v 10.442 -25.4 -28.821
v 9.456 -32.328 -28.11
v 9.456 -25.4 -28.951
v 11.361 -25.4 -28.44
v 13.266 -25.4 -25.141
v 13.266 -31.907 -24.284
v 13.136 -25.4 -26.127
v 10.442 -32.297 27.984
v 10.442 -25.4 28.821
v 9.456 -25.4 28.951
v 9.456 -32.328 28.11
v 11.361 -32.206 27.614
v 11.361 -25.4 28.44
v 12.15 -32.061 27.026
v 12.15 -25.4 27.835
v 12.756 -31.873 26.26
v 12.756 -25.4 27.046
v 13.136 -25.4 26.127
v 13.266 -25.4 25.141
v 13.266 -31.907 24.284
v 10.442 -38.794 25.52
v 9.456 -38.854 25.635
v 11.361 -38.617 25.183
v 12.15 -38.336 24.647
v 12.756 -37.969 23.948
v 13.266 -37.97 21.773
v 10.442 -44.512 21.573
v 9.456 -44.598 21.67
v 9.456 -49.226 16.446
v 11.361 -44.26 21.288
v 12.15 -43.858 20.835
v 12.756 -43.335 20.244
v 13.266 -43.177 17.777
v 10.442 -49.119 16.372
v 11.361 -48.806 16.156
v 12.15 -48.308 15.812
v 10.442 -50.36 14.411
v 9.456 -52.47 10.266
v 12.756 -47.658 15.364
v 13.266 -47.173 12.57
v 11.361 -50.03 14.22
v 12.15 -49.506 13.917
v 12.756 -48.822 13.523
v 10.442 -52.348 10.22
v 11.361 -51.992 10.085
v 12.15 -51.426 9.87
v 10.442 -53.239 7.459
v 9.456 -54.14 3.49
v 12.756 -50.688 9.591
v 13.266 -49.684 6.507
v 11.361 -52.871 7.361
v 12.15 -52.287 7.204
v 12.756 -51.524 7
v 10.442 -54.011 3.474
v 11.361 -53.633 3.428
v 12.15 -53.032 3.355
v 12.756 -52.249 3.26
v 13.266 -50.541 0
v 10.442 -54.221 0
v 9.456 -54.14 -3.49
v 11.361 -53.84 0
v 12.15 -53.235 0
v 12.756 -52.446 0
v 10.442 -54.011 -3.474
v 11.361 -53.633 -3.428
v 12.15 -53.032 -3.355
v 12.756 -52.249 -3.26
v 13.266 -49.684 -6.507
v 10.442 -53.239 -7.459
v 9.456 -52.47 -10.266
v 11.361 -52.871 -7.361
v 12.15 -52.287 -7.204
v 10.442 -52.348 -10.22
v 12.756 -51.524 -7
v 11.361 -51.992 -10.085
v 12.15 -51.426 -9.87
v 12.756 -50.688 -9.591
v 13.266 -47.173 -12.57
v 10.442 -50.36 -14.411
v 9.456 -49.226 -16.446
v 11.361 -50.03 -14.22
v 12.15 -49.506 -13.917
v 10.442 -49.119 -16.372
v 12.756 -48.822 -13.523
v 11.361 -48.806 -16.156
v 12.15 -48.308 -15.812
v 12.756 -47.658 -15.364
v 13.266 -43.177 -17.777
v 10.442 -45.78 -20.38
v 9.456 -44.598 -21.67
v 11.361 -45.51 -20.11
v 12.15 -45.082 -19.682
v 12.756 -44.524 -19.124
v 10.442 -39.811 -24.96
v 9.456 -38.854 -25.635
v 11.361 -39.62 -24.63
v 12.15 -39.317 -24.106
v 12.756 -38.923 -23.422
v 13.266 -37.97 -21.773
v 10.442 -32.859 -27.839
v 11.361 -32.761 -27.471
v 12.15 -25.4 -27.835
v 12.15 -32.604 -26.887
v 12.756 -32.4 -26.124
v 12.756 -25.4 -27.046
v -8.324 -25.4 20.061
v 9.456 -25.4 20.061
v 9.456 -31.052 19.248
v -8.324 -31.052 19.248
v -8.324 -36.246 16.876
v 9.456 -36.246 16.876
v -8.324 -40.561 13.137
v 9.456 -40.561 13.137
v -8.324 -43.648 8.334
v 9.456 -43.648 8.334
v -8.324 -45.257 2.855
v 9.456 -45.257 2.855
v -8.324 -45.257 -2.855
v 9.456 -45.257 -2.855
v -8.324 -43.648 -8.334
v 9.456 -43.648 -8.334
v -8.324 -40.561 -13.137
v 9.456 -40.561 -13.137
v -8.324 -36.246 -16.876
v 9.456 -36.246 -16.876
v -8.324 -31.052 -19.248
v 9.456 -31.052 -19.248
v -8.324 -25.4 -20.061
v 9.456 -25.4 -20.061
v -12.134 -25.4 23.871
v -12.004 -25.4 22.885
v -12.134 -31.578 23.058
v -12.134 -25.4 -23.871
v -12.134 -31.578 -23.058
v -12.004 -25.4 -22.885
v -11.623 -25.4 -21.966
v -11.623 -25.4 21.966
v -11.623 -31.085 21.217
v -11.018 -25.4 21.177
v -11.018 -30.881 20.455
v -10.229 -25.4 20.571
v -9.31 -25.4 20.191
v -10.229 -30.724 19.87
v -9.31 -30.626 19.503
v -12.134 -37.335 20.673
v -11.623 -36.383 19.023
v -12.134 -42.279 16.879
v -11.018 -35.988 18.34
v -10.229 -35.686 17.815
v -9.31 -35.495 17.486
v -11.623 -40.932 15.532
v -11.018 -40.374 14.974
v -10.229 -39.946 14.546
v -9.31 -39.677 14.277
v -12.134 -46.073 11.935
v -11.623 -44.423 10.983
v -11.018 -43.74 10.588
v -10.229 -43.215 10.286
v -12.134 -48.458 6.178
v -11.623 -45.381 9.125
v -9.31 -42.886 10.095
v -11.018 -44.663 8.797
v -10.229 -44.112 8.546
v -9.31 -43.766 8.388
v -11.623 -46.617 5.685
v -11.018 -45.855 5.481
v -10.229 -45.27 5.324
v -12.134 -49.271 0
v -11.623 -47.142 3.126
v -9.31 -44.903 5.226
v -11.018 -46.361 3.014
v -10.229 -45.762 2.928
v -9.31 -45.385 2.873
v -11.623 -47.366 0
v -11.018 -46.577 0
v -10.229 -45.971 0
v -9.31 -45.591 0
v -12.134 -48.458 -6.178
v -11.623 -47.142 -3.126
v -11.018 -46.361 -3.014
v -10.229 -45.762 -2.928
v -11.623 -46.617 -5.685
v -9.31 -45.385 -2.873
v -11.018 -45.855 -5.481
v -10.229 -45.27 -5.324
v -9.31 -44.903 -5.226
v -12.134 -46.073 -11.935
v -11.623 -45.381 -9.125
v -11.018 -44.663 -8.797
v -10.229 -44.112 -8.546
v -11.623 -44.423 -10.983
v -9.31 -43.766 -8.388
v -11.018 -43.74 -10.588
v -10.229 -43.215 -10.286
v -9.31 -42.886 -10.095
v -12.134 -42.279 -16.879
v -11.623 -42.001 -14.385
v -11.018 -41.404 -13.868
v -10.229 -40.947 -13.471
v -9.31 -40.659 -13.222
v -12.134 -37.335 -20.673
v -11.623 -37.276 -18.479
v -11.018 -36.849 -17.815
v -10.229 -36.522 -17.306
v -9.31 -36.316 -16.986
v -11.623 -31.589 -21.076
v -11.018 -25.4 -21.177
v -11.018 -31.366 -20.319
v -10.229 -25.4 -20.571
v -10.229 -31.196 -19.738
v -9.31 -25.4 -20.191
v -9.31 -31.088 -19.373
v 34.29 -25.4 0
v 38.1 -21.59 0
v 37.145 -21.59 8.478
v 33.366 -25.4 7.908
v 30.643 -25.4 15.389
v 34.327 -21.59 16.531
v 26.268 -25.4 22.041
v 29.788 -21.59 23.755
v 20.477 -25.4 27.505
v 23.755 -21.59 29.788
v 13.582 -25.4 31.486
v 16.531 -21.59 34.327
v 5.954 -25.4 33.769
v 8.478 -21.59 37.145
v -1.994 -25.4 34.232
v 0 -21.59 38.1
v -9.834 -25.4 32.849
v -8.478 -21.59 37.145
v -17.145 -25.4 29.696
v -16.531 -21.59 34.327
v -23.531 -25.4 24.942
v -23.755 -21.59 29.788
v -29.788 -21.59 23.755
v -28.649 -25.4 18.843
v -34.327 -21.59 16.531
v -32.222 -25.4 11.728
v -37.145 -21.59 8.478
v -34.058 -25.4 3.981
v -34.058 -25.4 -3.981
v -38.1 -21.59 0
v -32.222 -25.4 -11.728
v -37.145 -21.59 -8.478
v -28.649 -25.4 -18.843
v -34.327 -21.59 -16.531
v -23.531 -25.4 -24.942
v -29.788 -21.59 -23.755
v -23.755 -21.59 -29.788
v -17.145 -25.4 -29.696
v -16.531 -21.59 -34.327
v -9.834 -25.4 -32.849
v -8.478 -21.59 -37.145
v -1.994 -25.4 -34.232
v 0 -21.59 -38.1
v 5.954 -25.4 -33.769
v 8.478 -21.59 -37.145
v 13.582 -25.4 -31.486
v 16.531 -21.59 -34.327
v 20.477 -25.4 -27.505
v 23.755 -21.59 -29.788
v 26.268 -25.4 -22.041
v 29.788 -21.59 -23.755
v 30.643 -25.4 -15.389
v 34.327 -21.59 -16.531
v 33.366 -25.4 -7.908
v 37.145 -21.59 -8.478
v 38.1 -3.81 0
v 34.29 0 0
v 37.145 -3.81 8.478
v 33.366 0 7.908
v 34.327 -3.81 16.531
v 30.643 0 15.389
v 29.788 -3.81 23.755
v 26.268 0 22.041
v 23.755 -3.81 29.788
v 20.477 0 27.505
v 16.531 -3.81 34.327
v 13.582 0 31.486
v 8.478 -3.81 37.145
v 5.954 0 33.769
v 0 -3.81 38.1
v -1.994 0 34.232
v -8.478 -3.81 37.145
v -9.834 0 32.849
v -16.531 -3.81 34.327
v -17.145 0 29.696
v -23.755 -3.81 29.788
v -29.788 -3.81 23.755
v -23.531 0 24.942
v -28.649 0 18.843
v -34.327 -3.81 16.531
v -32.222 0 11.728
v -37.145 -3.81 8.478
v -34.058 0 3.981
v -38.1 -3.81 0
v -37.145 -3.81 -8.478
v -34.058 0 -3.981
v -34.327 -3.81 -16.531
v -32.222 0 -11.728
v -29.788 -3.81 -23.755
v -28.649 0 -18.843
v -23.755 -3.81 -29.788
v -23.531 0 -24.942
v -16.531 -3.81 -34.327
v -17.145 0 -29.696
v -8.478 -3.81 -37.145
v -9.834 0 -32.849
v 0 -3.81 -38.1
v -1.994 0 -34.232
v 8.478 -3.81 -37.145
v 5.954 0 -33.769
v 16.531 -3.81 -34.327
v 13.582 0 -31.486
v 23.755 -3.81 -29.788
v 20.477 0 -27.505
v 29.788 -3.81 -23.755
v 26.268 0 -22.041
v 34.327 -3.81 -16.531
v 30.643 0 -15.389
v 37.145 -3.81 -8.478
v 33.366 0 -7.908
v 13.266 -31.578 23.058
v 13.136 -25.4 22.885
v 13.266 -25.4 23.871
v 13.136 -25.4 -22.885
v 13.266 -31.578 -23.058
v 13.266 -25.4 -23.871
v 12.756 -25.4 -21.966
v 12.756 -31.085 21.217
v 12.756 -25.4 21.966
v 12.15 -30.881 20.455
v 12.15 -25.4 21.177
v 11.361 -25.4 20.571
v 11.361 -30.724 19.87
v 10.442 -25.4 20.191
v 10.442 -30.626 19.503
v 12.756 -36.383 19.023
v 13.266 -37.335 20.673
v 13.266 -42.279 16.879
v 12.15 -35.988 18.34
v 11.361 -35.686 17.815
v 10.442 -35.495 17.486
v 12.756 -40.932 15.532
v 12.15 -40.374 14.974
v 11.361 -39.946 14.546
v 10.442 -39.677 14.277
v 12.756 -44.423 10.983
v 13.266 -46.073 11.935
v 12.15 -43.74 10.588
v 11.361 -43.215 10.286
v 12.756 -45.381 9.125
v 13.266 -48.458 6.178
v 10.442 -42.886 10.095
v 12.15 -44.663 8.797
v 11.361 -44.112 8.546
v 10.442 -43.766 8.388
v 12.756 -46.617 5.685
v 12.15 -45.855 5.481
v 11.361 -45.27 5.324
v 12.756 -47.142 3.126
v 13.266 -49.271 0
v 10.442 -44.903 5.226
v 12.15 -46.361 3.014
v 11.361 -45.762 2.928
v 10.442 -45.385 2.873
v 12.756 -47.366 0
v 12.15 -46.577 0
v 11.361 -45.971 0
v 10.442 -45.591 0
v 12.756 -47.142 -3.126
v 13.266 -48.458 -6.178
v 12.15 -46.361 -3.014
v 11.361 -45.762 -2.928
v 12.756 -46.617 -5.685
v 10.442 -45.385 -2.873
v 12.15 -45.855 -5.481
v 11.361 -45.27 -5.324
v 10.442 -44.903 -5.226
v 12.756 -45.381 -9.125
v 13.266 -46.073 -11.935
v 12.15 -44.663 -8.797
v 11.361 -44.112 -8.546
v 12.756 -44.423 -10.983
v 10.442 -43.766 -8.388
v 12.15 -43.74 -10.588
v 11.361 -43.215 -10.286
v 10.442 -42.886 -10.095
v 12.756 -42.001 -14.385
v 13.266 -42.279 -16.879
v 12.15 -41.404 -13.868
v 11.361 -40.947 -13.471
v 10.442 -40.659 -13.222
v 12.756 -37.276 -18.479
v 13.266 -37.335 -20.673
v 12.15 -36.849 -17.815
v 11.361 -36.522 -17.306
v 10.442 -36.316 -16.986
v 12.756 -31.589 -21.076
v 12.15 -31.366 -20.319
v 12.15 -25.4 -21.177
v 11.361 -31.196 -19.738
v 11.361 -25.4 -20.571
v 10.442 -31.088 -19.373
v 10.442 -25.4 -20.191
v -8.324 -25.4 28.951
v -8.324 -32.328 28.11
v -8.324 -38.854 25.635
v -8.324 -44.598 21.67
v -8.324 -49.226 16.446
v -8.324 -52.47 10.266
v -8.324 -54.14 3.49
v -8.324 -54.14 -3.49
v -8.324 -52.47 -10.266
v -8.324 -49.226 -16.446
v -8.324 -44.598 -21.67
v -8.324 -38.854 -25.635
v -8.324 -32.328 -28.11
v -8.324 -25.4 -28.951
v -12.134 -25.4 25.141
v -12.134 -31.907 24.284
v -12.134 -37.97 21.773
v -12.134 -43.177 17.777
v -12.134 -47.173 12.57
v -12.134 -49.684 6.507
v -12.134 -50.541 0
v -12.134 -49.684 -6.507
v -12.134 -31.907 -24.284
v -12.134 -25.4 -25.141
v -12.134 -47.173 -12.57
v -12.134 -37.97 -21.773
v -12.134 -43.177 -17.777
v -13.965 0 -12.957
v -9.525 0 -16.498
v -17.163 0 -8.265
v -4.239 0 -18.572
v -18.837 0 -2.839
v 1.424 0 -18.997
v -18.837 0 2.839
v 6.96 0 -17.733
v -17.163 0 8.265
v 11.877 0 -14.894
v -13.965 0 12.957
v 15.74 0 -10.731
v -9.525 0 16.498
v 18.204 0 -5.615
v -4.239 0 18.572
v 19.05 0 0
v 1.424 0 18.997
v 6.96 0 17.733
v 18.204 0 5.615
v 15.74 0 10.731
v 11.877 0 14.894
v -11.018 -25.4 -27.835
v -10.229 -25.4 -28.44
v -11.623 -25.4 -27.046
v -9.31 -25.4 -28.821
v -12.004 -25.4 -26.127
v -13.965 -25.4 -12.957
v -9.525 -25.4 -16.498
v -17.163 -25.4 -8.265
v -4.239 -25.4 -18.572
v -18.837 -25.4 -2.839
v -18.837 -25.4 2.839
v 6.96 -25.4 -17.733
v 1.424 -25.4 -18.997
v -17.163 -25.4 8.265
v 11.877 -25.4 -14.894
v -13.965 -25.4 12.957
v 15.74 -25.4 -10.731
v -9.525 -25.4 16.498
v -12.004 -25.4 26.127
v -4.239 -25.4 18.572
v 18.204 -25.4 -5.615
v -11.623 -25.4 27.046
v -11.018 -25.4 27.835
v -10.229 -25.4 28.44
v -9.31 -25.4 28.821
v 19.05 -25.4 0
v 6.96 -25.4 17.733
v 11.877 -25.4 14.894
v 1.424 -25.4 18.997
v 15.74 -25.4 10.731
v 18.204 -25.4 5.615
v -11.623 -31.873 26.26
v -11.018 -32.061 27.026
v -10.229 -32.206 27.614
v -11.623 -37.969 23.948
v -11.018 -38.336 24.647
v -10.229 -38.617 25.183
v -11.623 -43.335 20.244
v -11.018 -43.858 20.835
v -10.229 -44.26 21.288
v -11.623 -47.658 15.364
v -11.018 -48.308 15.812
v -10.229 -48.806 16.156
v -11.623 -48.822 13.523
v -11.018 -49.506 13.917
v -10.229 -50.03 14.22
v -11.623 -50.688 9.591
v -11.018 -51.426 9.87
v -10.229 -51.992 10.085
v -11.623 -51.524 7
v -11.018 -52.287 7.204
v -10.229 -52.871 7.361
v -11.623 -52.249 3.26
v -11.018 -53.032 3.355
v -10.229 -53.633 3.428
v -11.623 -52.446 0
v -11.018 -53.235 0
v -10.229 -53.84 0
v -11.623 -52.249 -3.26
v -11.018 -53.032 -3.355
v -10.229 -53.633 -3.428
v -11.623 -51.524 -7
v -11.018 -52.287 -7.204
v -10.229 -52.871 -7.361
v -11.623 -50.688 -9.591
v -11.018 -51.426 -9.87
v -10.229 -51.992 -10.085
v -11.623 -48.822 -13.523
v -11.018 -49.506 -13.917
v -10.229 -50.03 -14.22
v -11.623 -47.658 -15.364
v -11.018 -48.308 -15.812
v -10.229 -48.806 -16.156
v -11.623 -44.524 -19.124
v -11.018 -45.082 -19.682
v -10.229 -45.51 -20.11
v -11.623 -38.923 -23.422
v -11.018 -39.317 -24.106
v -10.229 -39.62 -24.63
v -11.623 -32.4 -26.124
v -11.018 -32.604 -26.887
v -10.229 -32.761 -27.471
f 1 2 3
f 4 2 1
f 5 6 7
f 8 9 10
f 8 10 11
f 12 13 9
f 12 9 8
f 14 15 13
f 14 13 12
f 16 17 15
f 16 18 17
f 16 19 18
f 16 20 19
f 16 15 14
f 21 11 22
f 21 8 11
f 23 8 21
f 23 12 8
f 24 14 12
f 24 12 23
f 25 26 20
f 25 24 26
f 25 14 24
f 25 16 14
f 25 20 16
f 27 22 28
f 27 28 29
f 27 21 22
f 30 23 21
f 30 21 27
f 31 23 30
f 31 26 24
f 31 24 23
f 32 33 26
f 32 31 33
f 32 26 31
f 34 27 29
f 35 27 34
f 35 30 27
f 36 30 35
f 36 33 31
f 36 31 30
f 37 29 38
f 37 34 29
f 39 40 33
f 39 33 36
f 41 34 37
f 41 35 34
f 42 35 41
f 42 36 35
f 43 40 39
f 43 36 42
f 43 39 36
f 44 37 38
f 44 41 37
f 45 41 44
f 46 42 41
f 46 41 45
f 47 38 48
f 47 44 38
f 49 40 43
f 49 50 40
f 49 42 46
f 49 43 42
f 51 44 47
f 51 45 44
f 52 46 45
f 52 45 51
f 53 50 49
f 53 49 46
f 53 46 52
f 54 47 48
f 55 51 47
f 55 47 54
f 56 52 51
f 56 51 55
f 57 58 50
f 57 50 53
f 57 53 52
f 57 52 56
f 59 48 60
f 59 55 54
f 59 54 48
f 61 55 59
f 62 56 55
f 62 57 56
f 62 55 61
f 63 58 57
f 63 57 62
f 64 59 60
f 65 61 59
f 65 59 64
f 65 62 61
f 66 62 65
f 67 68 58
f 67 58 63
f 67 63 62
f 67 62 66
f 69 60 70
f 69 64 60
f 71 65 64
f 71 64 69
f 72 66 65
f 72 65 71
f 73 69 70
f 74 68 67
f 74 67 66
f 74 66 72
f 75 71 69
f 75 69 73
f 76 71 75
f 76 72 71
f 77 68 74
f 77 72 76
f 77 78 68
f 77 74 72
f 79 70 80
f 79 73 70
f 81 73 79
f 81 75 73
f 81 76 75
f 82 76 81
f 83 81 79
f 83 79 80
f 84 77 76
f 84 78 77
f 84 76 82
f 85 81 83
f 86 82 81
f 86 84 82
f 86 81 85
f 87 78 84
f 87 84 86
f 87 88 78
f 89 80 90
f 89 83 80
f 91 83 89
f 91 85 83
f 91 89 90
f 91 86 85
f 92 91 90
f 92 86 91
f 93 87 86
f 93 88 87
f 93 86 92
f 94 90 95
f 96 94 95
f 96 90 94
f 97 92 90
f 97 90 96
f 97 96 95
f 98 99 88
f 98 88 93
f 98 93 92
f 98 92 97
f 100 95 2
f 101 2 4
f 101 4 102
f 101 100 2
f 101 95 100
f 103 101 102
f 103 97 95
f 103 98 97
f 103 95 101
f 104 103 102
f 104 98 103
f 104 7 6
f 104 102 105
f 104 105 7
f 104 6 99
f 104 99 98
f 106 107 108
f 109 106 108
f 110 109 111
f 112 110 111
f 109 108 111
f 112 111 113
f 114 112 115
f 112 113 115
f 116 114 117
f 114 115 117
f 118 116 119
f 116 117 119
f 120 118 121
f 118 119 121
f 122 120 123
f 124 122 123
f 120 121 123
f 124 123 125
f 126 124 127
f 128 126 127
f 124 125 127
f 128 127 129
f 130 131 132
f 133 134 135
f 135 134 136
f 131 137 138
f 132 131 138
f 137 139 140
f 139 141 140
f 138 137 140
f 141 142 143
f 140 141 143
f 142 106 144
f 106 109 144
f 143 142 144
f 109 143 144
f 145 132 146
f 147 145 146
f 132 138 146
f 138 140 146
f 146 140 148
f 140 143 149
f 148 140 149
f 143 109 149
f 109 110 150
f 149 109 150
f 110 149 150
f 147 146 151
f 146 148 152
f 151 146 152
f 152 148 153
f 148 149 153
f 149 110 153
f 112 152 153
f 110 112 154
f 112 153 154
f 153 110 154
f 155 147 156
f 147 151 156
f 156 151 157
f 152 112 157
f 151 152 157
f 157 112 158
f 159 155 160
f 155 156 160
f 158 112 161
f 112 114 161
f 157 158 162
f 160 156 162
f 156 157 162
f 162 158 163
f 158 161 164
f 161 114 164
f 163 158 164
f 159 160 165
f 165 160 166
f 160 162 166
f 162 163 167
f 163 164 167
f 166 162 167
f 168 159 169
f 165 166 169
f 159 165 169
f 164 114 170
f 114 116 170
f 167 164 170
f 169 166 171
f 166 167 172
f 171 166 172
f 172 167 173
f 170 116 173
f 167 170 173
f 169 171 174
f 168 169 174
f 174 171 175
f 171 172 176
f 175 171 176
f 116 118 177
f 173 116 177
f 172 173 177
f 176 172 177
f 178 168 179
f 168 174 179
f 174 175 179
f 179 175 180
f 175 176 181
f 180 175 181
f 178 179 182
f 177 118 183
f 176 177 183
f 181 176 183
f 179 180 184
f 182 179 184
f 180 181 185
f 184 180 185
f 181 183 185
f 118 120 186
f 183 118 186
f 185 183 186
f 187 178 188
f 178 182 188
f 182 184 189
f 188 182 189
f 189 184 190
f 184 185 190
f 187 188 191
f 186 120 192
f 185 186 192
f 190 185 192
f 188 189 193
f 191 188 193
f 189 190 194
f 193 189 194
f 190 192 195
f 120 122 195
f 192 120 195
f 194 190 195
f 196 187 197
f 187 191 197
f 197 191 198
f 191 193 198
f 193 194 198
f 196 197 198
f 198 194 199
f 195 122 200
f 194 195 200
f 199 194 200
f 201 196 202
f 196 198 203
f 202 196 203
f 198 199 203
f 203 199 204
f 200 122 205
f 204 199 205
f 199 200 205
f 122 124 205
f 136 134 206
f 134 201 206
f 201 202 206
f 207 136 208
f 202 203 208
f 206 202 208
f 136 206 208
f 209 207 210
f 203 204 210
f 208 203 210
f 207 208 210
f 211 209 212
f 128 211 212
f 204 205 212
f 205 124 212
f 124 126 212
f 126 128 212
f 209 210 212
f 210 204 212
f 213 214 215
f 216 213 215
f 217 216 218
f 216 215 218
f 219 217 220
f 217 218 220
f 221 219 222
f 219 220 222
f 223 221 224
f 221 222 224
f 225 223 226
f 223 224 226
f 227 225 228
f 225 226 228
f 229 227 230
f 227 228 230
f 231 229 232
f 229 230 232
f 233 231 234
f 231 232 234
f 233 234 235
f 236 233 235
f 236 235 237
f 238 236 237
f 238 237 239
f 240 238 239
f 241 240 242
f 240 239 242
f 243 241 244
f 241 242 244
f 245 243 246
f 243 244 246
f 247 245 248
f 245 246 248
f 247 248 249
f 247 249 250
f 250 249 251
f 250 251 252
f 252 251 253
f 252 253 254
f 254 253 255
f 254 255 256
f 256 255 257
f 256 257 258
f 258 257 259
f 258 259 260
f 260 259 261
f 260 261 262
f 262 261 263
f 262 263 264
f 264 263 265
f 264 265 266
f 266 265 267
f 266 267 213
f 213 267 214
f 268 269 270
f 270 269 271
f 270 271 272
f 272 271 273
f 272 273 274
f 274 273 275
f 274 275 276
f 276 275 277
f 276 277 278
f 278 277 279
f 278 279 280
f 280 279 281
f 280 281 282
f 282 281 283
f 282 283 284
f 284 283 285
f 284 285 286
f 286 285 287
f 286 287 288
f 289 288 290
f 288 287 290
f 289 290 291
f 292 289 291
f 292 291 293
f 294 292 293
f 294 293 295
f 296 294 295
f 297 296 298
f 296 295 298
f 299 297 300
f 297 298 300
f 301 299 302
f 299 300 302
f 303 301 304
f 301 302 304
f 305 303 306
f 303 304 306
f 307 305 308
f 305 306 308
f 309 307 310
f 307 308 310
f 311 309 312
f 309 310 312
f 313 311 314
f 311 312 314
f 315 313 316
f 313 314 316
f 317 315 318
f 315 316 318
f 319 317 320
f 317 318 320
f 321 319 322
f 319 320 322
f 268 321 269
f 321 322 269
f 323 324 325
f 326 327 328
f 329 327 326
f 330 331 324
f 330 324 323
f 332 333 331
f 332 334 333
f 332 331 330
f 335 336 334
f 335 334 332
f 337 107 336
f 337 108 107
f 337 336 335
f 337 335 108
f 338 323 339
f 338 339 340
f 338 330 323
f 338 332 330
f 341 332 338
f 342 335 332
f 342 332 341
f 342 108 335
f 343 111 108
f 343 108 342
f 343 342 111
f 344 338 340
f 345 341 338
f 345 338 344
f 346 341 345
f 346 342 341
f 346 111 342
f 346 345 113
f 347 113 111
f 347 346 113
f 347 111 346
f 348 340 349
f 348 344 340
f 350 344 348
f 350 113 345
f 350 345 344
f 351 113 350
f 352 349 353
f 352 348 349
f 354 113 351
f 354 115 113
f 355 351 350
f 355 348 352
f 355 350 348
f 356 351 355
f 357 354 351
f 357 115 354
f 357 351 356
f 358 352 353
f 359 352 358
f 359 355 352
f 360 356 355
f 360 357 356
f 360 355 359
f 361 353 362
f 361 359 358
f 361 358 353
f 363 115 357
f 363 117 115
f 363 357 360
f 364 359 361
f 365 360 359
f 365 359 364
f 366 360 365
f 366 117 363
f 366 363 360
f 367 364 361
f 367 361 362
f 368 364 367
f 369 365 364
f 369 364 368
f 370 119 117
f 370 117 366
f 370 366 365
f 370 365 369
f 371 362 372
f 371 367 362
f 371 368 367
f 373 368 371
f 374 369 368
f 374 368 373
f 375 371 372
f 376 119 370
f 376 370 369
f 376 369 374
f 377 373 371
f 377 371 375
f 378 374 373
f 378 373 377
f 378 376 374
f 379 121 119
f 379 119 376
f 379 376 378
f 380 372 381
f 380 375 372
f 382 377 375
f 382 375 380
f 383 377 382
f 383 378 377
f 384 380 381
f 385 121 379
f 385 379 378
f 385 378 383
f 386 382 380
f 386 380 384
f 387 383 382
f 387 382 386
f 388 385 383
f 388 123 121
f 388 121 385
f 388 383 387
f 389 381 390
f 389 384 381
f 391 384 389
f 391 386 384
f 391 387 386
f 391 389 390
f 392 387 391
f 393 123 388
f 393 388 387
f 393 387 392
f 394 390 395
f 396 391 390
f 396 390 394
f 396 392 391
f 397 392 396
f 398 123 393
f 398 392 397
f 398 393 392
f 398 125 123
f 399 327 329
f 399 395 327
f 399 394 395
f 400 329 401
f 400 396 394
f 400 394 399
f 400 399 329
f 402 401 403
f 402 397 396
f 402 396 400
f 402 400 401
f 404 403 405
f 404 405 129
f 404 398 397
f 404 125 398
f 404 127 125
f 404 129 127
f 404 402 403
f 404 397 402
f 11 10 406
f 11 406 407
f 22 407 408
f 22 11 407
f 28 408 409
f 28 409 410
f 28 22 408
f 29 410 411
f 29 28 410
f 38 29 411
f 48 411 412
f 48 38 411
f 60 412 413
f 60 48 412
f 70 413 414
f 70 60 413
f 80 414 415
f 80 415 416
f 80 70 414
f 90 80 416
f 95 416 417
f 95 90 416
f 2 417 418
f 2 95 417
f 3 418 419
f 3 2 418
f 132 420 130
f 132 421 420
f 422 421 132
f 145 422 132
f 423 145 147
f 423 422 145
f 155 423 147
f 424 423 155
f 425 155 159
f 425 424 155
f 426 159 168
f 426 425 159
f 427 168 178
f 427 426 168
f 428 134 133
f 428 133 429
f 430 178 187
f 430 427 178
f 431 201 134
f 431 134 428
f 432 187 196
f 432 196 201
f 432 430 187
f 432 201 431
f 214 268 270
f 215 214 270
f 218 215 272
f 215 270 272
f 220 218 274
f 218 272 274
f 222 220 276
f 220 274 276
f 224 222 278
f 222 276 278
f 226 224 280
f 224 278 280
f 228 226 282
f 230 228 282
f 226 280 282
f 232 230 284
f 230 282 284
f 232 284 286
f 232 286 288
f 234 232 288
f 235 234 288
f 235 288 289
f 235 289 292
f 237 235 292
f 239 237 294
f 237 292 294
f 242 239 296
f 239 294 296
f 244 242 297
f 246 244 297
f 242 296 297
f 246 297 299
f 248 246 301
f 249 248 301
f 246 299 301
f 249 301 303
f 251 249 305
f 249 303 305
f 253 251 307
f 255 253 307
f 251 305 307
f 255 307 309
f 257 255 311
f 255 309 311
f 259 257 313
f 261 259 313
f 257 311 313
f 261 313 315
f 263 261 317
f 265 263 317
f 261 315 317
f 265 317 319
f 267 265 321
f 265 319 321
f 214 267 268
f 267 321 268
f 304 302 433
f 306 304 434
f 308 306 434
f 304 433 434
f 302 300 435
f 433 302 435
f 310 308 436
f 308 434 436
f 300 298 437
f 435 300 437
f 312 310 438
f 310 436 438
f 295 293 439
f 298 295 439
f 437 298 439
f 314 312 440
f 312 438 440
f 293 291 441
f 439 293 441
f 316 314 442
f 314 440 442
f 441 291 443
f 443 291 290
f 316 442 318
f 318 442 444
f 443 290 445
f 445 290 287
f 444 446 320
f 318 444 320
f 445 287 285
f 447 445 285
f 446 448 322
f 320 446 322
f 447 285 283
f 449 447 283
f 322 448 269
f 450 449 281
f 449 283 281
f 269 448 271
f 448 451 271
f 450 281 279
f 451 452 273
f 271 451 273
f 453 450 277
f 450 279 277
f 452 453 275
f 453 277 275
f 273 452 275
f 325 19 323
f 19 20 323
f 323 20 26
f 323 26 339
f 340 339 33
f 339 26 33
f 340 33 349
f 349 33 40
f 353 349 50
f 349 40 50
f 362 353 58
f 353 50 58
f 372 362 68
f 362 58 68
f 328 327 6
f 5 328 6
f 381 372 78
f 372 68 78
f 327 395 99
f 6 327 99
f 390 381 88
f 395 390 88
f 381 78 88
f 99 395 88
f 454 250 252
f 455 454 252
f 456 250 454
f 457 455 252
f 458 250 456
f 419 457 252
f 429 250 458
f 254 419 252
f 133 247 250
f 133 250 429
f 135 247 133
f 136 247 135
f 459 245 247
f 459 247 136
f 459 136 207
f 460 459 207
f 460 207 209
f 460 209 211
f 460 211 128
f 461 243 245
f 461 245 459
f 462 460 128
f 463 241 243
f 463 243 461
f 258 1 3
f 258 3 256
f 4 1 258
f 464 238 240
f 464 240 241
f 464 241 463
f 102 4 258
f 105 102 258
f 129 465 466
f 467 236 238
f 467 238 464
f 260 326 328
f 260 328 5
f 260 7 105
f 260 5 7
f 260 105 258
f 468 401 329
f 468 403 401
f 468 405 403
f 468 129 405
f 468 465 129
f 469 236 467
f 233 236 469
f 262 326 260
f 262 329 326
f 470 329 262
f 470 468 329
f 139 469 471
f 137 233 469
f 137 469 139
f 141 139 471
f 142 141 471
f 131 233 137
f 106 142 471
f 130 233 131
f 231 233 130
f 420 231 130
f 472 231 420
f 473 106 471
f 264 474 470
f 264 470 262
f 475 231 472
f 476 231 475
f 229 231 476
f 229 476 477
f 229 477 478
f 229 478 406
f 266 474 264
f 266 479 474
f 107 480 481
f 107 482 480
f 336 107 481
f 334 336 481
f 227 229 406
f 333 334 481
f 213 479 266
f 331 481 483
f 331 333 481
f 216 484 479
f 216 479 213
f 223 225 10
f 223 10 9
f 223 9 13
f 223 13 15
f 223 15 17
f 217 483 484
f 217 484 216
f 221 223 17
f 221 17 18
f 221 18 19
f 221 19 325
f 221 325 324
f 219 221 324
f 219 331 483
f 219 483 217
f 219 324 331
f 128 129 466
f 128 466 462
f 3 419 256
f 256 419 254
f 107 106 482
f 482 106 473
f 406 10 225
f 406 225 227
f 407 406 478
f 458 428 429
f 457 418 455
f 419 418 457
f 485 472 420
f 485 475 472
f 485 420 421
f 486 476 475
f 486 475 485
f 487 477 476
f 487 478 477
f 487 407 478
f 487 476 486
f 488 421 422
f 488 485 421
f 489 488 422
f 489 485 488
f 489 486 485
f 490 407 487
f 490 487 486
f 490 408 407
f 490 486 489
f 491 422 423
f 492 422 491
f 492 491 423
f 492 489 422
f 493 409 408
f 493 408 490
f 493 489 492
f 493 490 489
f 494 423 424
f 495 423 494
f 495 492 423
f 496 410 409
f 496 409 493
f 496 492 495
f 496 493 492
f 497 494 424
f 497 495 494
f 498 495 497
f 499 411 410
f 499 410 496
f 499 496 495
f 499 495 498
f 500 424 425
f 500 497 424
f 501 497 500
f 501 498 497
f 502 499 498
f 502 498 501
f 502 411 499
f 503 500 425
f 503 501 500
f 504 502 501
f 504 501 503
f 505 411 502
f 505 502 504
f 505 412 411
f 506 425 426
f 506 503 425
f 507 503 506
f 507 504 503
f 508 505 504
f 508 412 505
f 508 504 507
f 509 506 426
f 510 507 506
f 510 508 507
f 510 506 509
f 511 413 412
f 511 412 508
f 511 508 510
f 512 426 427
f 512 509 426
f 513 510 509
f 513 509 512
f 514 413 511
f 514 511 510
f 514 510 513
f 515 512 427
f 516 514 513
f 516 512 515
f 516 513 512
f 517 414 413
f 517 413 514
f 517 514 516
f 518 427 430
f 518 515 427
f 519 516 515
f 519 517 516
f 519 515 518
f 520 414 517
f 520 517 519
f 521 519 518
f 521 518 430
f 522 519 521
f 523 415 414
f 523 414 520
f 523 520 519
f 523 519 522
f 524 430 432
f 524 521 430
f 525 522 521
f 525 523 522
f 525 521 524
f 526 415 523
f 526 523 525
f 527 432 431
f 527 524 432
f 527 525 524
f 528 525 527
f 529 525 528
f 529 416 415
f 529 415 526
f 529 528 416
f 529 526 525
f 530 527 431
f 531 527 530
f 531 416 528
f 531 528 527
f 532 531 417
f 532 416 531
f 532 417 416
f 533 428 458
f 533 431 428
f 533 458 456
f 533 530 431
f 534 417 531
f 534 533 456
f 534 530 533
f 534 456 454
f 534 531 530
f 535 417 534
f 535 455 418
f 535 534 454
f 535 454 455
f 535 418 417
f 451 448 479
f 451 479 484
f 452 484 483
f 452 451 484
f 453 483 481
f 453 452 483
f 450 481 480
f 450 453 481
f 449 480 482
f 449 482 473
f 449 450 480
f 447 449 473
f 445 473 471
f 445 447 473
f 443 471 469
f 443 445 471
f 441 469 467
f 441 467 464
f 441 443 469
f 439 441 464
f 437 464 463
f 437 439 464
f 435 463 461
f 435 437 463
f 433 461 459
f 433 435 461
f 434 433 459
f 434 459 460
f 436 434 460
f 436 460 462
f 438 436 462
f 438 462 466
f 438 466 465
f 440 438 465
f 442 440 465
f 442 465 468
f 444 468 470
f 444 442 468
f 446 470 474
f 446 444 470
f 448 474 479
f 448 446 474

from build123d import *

# Parameters (mm, degrees)
F0_R     = 38.1
F0_R_2   = 19.05
F1_DEPTH = 25.4
F2_W     = 25.4
F2_H     = 8.89
F3_ANGLE = 180
F4_R     = 3.81
F5_SIZE  = 3.81


with BuildPart() as f1:
    # F0 (on Front) → F1 (new body)
    with BuildSketch(Plane.XZ):
        Circle(F0_R)
        Circle(F0_R_2, mode=Mode.SUBTRACT)
    extrude(amount=F1_DEPTH)

    # F2 (on face) → F3 (revolve)
    with BuildSketch(Plane.XZ.offset(25.4)):
        with Locations((0.5661081523, 24.5059088439)):
            Rectangle(F2_W, F2_H)
    revolve(axis=Axis((-5.3780302405, -25.4, 0), (1, 0, 0)), revolution_arc=F3_ANGLE)

    # F4
    f4_edges = [f1.edges().sort_by_distance(p)[0] for p in [
        (13.266108, -54.350909, 0),
        (-12.133892, -54.350909, 0),
        (13.266108, -45.460909, 0),
        (-12.133892, -45.460909, 0),
    ]]
    fillet(f4_edges, radius=F4_R)

    # F5
    f5_edges = [f1.edges().sort_by_distance(p)[0] for p in [
        (-38.1, -25.4, 0),
        (-38.1, 0, 0),
    ]]
    chamfer(f5_edges, length=F5_SIZE)


solid = f1.part
